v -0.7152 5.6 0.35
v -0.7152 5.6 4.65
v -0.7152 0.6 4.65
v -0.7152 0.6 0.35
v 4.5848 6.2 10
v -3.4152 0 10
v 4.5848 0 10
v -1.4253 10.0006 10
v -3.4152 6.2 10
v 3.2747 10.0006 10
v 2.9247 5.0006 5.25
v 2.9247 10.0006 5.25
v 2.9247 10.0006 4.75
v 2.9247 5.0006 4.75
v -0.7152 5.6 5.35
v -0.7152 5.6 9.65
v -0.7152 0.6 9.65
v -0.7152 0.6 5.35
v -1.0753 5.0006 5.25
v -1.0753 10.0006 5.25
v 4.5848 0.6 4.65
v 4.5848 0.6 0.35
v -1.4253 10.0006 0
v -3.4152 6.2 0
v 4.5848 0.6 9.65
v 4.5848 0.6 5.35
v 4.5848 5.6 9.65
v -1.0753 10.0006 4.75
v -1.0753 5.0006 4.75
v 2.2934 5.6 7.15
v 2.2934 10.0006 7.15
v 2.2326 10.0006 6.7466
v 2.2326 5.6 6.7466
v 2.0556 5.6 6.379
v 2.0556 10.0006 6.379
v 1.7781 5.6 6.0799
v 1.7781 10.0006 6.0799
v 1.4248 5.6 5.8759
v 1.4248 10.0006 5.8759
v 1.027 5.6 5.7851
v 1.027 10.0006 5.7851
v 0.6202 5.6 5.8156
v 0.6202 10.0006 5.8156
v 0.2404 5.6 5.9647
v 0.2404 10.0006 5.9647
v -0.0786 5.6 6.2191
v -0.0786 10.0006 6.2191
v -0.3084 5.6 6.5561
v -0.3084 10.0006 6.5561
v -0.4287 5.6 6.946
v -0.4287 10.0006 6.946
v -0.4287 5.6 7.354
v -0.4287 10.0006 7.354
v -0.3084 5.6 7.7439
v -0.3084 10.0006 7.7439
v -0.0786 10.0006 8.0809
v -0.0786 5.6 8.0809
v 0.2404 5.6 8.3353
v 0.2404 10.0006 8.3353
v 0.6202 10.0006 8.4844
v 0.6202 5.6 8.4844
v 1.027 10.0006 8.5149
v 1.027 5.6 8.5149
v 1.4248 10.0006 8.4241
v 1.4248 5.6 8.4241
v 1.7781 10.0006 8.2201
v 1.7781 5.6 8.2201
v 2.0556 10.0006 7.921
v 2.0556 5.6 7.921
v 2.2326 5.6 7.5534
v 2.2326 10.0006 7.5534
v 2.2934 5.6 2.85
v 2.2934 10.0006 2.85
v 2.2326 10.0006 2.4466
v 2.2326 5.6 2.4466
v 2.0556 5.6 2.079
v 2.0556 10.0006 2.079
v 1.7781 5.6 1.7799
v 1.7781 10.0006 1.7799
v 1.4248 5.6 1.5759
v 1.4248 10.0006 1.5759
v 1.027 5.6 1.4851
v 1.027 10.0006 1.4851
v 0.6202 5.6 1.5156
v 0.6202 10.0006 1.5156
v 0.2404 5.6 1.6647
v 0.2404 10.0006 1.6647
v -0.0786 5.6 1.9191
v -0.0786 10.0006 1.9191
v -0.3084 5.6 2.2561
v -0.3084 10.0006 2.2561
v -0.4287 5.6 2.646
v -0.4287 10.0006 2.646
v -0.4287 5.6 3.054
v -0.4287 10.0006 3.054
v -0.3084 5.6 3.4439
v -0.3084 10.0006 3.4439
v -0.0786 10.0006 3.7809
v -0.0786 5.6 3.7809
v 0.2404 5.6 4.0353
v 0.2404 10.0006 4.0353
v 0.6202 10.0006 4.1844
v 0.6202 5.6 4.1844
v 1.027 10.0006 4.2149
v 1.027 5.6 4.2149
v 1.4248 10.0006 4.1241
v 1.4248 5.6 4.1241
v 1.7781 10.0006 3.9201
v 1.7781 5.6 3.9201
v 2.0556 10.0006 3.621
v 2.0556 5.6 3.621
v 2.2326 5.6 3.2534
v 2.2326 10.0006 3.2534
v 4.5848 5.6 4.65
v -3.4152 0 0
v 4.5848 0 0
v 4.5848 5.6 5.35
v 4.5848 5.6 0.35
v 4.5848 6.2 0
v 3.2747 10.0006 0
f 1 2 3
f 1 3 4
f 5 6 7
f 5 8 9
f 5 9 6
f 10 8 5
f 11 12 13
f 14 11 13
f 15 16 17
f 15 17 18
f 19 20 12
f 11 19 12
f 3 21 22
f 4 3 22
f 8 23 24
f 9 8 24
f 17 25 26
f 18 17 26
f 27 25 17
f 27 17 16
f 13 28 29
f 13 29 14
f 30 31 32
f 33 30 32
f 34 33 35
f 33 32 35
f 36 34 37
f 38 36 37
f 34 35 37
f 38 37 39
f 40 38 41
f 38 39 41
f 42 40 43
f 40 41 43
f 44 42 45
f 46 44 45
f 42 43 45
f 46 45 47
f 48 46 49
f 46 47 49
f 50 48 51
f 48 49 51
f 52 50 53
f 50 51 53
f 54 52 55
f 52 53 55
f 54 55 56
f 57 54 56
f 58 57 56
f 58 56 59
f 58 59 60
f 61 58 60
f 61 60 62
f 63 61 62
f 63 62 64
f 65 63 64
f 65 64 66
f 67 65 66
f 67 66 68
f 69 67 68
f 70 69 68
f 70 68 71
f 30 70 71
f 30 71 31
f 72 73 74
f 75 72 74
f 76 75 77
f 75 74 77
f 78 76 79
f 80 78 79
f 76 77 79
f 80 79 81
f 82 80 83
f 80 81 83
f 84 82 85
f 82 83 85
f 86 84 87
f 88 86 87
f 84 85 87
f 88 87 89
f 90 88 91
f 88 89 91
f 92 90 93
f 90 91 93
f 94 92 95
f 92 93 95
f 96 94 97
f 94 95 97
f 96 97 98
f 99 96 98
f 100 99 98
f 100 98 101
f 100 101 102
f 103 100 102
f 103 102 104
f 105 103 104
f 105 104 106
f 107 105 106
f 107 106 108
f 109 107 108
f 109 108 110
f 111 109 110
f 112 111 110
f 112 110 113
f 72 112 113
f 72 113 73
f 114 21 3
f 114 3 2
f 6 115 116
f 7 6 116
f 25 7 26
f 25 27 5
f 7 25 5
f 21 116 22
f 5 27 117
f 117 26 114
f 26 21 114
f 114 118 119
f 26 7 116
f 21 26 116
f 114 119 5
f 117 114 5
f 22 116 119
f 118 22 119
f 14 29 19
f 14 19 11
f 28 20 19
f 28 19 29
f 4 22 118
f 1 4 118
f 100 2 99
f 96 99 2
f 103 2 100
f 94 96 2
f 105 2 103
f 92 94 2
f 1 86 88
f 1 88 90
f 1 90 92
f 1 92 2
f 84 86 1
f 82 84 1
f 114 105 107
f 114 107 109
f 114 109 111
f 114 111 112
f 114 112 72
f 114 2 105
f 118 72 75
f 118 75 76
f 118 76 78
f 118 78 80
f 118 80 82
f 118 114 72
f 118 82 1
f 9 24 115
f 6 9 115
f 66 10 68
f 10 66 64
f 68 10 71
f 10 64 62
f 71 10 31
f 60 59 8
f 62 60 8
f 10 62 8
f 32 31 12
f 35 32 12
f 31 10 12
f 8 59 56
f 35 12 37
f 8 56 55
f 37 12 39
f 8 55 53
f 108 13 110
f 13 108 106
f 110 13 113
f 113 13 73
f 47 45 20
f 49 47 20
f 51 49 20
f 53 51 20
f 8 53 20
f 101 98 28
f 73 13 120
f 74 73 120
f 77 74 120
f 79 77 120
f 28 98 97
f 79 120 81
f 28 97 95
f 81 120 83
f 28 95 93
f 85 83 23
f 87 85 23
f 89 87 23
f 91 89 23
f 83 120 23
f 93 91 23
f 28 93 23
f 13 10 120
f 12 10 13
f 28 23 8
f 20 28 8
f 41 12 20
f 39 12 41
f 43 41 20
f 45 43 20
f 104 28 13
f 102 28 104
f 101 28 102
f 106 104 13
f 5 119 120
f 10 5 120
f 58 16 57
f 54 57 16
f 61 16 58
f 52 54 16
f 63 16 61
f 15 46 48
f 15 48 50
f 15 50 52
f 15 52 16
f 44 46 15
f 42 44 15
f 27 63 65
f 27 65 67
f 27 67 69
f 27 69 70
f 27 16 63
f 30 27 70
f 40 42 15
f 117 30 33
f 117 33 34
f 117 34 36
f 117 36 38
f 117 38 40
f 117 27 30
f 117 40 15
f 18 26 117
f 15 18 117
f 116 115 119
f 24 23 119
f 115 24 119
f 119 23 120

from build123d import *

# Parameters (mm, degrees)
BOSS_EXTRUDE1_DEPTH = 10
SKETCH2_W           = 4.3
SKETCH2_H           = 5
CUT_EXTRUDE1_DEPTH  = 5.3
SKETCH3_R           = 1.368686713
SKETCH3_W           = 4
SKETCH3_H           = 0.5
CUT_EXTRUDE2_DEPTH  = 5


with BuildPart() as part:
    # Sketch1 → Boss-Extrude1 (new body)
    with BuildSketch(Plane.XY):
        Polygon((-3.415220484, 0), (4.584779516, 0), (4.584779516, 6.2), (3.274734062, 10.00055008), (-1.425265938, 10.00055008), (-3.415220484, 6.2), align=None)
    extrude(amount=BOSS_EXTRUDE1_DEPTH)

    # Sketch2 → Cut-Extrude1 (cut)
    with BuildSketch(Plane(origin=(4.584779516, 0, 0), x_dir=(0, 0, -1), z_dir=(1, 0, 0))):
        with Locations((-7.5, 3.1)):
            Rectangle(SKETCH2_W, SKETCH2_H)
        with Locations((-2.5, 3.1)):
            Rectangle(SKETCH2_W, SKETCH2_H)
    extrude(amount=-CUT_EXTRUDE1_DEPTH, mode=Mode.SUBTRACT)

    # Sketch3 → Cut-Extrude2 (cut)
    with BuildSketch(Plane(origin=(0, 10.00055008, 0), x_dir=(1, 0, 0), z_dir=(0, 1, 0))):
        with Locations((0.924734062, -2.85)):
            Circle(SKETCH3_R)
        with Locations((0.924734062, -7.15)):
            Circle(SKETCH3_R)
        with Locations((0.924734062, -5)):
            Rectangle(SKETCH3_W, SKETCH3_H)
    extrude(amount=-CUT_EXTRUDE2_DEPTH, mode=Mode.SUBTRACT)


solid = part.part
